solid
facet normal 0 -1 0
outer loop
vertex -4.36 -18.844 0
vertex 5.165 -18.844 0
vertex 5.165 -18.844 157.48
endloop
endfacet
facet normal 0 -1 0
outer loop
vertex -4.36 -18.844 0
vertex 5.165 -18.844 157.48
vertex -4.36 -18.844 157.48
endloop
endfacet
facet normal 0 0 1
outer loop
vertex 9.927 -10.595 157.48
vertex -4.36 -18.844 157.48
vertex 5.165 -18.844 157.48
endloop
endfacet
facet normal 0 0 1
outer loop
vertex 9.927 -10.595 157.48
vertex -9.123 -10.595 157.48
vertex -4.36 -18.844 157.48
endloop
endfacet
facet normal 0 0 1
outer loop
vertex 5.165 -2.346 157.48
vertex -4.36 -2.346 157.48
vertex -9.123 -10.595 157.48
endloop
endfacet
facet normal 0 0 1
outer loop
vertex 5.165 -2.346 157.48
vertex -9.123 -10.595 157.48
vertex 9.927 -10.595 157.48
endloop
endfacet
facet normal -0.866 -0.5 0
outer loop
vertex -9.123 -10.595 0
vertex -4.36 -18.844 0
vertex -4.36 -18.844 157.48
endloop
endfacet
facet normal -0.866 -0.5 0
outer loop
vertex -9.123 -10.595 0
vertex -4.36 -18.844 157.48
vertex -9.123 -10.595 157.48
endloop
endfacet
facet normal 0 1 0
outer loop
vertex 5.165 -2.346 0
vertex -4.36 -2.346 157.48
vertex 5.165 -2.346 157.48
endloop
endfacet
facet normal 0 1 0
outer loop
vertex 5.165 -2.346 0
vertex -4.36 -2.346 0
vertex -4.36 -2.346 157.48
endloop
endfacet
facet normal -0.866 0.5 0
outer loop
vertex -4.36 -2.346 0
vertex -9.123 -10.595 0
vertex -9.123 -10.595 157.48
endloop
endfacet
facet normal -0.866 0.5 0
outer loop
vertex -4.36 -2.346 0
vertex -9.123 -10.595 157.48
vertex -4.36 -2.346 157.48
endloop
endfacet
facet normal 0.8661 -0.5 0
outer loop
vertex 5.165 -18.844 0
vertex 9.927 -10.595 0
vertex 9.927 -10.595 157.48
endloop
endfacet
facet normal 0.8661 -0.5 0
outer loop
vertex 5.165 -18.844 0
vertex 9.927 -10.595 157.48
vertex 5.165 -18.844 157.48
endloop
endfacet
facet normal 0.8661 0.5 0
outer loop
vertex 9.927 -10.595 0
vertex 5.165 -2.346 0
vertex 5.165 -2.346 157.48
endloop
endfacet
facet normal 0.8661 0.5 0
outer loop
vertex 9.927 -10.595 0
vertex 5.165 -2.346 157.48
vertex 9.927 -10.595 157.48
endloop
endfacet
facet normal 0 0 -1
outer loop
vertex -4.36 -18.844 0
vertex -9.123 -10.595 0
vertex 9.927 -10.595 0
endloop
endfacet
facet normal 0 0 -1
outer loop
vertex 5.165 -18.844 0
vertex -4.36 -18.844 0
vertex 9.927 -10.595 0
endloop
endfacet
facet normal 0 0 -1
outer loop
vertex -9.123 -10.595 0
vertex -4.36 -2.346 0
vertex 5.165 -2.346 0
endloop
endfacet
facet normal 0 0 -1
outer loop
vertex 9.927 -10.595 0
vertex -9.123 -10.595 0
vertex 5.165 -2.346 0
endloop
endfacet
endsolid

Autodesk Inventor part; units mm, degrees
ref_plane "YZ Plane" through (0, 0, 0) normal (1, 0, 0) x (0, 1, 0)
ref_plane "XZ Plane" through (0, 0, 0) normal (0, 1, 0) x (-1, 0, 0)
ref_plane "XY Plane" through (0, 0, 0) normal (0, 0, 1) x (1, 0, 0)
sketch "Sketch1" plane through (0, 0, 0) normal (0, 0, 1) x (1, 0, 0)
  line L0 (-4.3602, -2.3462) -> (5.1648, -2.3462)
  line L1 (5.1648, -2.3462) -> (9.9273, -10.5951)
  line L2 (9.9273, -10.5951) -> (5.1648, -18.844)
  line L3 (5.1648, -18.844) -> (-4.3602, -18.844)
  line L4 (-4.3602, -18.844) -> (-9.1227, -10.5951)
  line L5 (-9.1227, -10.5951) -> (-4.3602, -2.3462)
  point P0 (0, 0)
  dimension "d0" = 9.525
  dimension "d1" = 9.525
  dimension "d2" = 9.525
  dimension "d3" = 9.525
  dimension "d4" = 9.525
  dimension "d6" = 9.525
  dimension "d7" = 120
  dimension "d8" = 120
  dimension "d9" = 120
  dimension "d10" = 120
  dimension "d11" = 120
extrude "Extrusion1" add sketch "Sketch1" along normal blind 157.48
properties part number "hex shaft"
